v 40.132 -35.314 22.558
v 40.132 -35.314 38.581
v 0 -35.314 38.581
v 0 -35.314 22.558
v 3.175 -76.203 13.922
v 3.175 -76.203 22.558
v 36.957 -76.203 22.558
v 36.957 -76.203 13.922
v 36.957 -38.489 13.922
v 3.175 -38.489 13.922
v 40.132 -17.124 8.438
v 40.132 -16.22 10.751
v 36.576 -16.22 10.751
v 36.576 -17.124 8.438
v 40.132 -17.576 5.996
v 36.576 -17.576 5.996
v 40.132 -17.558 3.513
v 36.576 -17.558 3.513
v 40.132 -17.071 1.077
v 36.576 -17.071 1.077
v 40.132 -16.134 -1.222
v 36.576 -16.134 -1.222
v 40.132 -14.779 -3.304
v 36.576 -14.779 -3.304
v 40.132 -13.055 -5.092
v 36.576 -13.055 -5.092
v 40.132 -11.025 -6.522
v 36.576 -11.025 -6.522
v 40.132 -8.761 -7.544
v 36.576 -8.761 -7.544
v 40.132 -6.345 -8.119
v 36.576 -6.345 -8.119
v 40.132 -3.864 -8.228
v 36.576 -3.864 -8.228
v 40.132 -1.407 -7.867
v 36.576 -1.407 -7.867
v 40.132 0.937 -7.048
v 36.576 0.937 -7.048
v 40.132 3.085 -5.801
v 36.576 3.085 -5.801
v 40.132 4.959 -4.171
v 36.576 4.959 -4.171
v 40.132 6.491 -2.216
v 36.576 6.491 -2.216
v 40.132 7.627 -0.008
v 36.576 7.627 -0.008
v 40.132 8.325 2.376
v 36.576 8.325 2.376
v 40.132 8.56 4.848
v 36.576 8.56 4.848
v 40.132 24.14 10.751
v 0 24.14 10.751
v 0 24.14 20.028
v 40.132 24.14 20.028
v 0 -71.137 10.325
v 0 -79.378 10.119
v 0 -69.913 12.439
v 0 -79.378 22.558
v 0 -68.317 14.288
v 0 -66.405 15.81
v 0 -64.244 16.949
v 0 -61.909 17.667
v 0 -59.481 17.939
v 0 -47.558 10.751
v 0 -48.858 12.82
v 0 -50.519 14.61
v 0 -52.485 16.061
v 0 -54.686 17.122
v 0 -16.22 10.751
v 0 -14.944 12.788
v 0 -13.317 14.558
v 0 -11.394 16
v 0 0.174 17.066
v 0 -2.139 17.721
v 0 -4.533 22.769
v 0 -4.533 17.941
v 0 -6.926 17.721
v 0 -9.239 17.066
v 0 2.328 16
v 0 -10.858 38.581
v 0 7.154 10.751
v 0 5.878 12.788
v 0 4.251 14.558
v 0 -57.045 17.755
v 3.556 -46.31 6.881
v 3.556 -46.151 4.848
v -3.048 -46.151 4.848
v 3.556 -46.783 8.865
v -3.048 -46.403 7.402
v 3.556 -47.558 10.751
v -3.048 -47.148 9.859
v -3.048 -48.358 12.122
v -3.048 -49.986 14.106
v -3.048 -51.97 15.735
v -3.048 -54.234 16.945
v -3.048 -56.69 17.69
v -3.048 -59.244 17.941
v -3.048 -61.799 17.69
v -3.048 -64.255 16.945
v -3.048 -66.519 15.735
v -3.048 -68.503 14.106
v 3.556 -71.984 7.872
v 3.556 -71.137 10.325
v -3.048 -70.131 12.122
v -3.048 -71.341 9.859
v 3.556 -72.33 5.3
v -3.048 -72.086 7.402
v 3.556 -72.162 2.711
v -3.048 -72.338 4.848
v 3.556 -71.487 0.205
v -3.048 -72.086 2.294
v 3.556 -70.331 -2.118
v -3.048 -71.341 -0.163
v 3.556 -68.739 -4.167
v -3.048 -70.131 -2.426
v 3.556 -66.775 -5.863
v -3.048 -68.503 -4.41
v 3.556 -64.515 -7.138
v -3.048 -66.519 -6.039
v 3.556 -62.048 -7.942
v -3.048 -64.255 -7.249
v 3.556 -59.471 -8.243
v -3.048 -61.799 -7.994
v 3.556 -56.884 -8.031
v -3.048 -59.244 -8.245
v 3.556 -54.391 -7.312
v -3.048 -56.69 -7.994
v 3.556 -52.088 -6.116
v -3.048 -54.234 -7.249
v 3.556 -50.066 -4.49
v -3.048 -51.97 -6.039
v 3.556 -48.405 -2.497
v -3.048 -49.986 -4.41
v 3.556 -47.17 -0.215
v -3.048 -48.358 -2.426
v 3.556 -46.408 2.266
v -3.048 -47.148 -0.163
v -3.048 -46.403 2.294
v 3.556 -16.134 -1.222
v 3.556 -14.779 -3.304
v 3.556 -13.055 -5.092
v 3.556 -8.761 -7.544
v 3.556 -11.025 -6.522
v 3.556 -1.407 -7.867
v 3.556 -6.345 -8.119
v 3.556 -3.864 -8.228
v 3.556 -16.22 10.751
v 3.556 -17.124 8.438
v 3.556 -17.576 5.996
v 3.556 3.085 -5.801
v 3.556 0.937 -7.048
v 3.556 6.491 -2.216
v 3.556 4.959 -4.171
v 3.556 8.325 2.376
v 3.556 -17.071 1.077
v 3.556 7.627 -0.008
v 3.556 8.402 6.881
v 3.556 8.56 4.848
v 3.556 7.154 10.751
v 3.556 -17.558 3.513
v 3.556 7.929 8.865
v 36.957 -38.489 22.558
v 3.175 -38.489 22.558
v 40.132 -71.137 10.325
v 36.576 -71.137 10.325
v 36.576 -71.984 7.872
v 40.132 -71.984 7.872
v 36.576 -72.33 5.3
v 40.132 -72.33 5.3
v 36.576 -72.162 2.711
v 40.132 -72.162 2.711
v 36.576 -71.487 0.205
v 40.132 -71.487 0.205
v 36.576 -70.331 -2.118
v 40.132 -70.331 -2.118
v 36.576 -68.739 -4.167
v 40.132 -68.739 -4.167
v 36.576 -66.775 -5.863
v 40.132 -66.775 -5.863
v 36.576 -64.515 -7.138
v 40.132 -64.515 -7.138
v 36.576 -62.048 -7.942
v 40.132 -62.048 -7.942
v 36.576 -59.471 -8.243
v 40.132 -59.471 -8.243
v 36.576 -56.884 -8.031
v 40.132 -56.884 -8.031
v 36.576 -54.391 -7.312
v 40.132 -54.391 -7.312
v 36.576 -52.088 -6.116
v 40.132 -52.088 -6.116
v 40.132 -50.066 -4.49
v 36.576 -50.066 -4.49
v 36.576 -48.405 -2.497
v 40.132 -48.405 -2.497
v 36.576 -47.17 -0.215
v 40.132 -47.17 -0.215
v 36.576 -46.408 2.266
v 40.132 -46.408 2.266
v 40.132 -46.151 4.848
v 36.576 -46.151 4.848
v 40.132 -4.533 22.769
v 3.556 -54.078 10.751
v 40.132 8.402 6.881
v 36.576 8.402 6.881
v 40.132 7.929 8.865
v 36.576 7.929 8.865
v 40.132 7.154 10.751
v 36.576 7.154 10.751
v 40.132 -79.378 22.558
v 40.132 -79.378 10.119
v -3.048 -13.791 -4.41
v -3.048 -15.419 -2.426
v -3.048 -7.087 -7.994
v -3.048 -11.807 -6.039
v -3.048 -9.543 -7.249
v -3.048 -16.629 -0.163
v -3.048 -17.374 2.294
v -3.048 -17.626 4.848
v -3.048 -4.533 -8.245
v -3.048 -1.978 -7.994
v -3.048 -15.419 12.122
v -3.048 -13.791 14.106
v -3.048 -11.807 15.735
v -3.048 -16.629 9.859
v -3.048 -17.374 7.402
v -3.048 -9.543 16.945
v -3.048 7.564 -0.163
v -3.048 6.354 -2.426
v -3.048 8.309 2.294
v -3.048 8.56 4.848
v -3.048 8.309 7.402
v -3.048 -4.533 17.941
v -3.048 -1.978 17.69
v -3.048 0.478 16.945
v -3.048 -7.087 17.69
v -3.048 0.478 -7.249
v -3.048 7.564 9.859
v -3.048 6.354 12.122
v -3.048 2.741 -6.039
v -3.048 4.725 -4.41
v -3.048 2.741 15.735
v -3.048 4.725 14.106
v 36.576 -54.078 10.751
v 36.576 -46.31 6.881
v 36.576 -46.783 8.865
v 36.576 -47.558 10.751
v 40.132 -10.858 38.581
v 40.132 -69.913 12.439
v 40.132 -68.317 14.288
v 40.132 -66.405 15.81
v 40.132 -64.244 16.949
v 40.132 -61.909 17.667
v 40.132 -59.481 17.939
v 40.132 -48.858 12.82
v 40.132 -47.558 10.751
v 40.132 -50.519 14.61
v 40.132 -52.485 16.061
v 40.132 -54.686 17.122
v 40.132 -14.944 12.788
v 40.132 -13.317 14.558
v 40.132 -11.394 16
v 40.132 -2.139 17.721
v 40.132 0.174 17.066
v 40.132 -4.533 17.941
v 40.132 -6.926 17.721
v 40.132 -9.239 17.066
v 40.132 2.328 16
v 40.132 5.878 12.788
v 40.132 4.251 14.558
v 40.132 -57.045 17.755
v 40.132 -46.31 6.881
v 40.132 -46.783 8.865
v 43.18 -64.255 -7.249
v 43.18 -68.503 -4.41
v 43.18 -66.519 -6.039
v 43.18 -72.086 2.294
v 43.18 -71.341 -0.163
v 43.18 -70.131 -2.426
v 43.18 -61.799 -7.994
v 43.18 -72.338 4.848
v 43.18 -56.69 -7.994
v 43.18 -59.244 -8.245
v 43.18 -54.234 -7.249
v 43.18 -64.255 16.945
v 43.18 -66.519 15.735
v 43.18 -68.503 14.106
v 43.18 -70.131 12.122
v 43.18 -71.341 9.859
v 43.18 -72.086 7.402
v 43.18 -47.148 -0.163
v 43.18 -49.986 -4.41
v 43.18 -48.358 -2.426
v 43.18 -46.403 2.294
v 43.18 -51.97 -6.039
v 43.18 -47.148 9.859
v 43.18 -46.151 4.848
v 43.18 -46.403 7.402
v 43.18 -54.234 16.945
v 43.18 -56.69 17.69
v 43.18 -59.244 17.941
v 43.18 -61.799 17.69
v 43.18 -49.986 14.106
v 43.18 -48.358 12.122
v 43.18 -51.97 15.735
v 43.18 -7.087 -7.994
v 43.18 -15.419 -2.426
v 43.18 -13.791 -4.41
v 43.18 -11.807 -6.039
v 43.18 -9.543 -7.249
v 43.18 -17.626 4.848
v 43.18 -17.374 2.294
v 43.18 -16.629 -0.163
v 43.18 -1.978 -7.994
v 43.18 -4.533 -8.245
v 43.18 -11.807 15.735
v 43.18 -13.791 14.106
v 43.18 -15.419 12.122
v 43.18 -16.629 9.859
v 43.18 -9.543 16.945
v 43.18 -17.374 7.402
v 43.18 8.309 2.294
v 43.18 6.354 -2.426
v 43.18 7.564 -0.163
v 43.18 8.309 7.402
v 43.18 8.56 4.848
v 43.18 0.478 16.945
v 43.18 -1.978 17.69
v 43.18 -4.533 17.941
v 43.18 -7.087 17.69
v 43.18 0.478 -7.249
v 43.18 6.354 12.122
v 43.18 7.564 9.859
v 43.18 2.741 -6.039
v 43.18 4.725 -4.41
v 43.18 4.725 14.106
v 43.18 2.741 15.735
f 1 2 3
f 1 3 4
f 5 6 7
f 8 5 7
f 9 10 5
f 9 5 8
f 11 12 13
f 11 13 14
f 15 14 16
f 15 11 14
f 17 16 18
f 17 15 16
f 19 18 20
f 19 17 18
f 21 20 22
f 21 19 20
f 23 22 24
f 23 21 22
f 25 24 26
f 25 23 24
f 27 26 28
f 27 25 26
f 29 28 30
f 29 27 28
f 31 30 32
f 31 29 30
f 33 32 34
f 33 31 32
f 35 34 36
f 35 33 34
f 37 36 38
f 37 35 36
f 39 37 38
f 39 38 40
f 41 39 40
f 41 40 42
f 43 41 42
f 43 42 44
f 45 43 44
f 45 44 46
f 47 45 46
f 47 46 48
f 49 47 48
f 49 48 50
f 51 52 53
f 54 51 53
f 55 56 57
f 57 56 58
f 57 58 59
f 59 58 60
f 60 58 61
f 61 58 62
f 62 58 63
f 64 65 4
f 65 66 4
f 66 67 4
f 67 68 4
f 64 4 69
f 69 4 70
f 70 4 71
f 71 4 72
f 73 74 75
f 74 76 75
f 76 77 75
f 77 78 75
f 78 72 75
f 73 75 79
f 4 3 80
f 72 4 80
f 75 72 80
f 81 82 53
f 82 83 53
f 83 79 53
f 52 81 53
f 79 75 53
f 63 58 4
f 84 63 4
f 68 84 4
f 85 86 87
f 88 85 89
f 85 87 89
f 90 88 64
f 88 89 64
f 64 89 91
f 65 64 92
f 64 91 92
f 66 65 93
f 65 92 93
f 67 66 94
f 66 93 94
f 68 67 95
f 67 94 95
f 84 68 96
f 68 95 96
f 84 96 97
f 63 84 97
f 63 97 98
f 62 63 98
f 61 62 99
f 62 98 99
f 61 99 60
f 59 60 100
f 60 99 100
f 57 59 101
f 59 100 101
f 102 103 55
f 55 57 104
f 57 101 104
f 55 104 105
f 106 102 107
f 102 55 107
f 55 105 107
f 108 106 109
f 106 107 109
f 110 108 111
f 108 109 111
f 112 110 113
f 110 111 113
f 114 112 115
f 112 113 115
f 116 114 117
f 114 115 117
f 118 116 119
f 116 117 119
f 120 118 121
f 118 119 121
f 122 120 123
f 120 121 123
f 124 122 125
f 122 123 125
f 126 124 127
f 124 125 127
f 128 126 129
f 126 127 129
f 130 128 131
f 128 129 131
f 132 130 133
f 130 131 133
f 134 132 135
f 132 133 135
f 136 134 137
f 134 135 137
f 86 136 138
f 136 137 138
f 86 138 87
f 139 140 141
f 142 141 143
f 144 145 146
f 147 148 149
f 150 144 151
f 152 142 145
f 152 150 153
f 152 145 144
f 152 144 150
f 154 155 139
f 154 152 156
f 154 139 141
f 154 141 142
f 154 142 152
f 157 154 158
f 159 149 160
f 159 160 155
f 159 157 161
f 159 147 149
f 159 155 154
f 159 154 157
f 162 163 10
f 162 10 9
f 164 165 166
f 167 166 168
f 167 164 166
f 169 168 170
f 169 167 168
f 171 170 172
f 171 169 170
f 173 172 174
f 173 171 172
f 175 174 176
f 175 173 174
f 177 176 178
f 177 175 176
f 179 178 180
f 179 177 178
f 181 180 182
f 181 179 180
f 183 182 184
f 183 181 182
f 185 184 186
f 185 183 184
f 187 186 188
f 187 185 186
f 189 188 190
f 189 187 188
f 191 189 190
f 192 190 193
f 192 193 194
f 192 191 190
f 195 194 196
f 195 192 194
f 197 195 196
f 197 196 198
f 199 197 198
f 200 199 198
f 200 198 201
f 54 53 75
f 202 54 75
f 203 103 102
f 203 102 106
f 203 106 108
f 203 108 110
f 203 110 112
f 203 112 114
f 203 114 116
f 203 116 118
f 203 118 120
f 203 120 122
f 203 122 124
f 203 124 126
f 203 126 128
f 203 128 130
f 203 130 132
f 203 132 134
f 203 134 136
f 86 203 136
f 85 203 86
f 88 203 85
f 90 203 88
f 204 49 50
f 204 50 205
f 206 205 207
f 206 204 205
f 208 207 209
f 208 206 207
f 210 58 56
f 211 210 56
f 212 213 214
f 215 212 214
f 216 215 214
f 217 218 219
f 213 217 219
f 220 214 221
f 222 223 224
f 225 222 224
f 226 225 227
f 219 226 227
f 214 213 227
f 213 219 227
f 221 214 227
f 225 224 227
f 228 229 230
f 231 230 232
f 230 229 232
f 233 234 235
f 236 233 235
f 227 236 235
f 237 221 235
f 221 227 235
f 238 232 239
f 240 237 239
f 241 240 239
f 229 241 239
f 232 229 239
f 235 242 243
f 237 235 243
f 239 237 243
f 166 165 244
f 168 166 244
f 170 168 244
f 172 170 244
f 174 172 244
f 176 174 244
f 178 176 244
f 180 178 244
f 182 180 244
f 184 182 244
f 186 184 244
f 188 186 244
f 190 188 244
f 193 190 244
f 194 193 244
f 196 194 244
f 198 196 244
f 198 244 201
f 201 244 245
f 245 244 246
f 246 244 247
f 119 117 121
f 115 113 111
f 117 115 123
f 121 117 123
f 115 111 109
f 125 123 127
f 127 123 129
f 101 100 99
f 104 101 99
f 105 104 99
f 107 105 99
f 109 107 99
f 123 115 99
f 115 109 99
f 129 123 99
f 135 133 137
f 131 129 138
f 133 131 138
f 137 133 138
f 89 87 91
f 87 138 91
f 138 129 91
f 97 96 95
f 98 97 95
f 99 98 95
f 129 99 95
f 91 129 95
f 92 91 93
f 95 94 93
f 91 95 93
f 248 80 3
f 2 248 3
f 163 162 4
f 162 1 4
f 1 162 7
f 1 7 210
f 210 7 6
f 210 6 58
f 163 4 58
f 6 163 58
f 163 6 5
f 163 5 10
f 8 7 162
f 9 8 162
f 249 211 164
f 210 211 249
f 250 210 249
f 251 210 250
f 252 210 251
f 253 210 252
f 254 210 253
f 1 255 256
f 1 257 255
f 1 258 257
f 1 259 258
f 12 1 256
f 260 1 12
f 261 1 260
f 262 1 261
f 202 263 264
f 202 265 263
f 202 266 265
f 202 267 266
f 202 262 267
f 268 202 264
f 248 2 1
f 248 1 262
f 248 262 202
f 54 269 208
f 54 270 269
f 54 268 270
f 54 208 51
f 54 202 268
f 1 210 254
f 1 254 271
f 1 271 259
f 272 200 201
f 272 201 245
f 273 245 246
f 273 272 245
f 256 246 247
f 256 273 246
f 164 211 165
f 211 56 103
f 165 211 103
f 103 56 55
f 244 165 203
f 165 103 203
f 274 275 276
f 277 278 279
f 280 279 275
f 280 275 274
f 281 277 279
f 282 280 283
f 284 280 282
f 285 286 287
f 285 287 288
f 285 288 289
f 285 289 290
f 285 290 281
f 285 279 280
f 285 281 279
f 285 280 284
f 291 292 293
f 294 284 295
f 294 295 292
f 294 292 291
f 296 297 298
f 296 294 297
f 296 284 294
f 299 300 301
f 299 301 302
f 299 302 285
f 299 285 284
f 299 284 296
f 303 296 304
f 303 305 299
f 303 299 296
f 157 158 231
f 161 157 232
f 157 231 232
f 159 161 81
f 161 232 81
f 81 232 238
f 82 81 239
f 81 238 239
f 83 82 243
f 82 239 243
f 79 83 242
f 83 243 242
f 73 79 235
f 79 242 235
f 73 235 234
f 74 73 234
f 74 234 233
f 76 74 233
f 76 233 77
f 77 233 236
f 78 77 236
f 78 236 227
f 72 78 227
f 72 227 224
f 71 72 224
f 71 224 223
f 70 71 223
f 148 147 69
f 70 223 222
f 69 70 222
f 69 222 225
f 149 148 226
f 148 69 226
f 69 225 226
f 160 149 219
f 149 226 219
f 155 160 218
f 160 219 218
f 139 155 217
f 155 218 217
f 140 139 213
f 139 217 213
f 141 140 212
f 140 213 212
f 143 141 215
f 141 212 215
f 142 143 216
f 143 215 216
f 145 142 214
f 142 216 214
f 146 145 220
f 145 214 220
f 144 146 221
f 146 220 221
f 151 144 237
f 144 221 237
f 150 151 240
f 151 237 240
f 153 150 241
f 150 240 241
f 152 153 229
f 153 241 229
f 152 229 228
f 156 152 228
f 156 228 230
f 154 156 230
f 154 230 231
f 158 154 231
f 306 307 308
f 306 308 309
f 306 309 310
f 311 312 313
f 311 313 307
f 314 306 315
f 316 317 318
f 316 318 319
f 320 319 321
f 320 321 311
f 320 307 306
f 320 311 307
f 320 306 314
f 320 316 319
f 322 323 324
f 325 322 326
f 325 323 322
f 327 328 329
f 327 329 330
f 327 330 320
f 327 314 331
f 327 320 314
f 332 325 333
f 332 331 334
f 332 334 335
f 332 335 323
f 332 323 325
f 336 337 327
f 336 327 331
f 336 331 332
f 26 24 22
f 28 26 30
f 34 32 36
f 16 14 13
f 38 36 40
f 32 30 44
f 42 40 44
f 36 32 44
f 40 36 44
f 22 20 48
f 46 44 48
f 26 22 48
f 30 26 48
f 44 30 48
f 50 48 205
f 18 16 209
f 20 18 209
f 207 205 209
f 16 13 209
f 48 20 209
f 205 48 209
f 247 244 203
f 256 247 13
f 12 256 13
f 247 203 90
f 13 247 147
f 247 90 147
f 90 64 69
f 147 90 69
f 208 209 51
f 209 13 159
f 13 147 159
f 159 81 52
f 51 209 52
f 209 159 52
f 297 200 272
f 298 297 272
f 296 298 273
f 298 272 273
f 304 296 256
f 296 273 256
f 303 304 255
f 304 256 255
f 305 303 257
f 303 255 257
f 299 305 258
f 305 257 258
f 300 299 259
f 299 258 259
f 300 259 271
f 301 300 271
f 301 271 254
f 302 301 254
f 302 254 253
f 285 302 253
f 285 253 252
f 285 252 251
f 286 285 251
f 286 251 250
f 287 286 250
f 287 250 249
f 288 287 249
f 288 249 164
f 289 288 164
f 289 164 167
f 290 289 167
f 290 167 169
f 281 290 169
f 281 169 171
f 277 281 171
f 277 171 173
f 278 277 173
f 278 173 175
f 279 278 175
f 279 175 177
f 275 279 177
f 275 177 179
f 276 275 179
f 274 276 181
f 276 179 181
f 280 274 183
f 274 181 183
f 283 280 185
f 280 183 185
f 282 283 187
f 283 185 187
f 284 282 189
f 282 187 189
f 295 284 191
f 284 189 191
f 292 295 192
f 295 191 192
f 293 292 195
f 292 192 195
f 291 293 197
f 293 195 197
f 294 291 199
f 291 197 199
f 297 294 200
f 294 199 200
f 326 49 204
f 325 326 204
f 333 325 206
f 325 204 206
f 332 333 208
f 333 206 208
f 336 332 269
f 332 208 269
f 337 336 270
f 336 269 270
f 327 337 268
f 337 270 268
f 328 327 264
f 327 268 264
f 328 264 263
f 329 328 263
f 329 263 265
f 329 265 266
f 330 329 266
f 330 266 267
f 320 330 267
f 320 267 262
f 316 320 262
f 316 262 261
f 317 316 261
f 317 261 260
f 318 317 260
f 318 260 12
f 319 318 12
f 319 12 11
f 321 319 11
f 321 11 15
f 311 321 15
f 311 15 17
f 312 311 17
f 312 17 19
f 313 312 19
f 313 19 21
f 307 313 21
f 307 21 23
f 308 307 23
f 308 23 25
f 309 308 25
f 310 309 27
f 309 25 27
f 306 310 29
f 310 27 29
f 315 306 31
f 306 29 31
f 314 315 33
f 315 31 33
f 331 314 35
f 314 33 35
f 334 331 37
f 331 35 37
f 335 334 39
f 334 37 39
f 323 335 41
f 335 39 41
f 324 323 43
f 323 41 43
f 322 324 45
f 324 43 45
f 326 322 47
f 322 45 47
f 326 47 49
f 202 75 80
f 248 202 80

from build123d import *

# Parameters (mm, degrees)
F1_DEPTH      = 40.132
F2_R          = 13.093188
F3_DEPTH      = 3.048
F3_DEPTH_BACK = 3.556
F7_W          = 33.782
F7_H          = 37.713479
F8_DEPTH      = 8.636


with BuildPart() as f1:
    # F0 (on Right) → F1 (new body)
    with BuildSketch(Plane.YZ):
        Polygon((-79.37751, 10.118734), (-54.077905, 10.751224), (24.140039, 10.751224), (24.140039, 20.027746), (-4.532847, 22.768537), (-10.857747, 38.58079), (-35.314031, 38.58079), (-35.314031, 22.557706), (-79.37751, 22.557706), align=None)
    extrude(amount=F1_DEPTH)

    # F2 (on face) → F3 (join, two sides)
    with BuildSketch(Plane.YZ.offset(40.132)) as f3_sk:
        with Locations((-59.244439, 4.847982)):
            Circle(F2_R)
        with Locations((-4.532847, 4.847982)):
            Circle(F2_R)
    extrude(amount=F3_DEPTH)
    extrude(f3_sk.sketch, amount=-F3_DEPTH_BACK)

    # F6: F1 across plane


with BuildPart() as f1_1:
    add(f1.part)
    add(f1.part.mirror(Plane(origin=(20.066, -10.857747, 38.58079), x_dir=(0, 1, 0), z_dir=(1, 0, 0))))

    # F7 (on face) → F8 (cut)
    with BuildSketch(Plane.XY.offset(22.557706)):
        with Locations((20.066, -57.34577)):
            Rectangle(F7_W, F7_H)
    extrude(amount=-F8_DEPTH, mode=Mode.SUBTRACT)


solid = f1_1.part
